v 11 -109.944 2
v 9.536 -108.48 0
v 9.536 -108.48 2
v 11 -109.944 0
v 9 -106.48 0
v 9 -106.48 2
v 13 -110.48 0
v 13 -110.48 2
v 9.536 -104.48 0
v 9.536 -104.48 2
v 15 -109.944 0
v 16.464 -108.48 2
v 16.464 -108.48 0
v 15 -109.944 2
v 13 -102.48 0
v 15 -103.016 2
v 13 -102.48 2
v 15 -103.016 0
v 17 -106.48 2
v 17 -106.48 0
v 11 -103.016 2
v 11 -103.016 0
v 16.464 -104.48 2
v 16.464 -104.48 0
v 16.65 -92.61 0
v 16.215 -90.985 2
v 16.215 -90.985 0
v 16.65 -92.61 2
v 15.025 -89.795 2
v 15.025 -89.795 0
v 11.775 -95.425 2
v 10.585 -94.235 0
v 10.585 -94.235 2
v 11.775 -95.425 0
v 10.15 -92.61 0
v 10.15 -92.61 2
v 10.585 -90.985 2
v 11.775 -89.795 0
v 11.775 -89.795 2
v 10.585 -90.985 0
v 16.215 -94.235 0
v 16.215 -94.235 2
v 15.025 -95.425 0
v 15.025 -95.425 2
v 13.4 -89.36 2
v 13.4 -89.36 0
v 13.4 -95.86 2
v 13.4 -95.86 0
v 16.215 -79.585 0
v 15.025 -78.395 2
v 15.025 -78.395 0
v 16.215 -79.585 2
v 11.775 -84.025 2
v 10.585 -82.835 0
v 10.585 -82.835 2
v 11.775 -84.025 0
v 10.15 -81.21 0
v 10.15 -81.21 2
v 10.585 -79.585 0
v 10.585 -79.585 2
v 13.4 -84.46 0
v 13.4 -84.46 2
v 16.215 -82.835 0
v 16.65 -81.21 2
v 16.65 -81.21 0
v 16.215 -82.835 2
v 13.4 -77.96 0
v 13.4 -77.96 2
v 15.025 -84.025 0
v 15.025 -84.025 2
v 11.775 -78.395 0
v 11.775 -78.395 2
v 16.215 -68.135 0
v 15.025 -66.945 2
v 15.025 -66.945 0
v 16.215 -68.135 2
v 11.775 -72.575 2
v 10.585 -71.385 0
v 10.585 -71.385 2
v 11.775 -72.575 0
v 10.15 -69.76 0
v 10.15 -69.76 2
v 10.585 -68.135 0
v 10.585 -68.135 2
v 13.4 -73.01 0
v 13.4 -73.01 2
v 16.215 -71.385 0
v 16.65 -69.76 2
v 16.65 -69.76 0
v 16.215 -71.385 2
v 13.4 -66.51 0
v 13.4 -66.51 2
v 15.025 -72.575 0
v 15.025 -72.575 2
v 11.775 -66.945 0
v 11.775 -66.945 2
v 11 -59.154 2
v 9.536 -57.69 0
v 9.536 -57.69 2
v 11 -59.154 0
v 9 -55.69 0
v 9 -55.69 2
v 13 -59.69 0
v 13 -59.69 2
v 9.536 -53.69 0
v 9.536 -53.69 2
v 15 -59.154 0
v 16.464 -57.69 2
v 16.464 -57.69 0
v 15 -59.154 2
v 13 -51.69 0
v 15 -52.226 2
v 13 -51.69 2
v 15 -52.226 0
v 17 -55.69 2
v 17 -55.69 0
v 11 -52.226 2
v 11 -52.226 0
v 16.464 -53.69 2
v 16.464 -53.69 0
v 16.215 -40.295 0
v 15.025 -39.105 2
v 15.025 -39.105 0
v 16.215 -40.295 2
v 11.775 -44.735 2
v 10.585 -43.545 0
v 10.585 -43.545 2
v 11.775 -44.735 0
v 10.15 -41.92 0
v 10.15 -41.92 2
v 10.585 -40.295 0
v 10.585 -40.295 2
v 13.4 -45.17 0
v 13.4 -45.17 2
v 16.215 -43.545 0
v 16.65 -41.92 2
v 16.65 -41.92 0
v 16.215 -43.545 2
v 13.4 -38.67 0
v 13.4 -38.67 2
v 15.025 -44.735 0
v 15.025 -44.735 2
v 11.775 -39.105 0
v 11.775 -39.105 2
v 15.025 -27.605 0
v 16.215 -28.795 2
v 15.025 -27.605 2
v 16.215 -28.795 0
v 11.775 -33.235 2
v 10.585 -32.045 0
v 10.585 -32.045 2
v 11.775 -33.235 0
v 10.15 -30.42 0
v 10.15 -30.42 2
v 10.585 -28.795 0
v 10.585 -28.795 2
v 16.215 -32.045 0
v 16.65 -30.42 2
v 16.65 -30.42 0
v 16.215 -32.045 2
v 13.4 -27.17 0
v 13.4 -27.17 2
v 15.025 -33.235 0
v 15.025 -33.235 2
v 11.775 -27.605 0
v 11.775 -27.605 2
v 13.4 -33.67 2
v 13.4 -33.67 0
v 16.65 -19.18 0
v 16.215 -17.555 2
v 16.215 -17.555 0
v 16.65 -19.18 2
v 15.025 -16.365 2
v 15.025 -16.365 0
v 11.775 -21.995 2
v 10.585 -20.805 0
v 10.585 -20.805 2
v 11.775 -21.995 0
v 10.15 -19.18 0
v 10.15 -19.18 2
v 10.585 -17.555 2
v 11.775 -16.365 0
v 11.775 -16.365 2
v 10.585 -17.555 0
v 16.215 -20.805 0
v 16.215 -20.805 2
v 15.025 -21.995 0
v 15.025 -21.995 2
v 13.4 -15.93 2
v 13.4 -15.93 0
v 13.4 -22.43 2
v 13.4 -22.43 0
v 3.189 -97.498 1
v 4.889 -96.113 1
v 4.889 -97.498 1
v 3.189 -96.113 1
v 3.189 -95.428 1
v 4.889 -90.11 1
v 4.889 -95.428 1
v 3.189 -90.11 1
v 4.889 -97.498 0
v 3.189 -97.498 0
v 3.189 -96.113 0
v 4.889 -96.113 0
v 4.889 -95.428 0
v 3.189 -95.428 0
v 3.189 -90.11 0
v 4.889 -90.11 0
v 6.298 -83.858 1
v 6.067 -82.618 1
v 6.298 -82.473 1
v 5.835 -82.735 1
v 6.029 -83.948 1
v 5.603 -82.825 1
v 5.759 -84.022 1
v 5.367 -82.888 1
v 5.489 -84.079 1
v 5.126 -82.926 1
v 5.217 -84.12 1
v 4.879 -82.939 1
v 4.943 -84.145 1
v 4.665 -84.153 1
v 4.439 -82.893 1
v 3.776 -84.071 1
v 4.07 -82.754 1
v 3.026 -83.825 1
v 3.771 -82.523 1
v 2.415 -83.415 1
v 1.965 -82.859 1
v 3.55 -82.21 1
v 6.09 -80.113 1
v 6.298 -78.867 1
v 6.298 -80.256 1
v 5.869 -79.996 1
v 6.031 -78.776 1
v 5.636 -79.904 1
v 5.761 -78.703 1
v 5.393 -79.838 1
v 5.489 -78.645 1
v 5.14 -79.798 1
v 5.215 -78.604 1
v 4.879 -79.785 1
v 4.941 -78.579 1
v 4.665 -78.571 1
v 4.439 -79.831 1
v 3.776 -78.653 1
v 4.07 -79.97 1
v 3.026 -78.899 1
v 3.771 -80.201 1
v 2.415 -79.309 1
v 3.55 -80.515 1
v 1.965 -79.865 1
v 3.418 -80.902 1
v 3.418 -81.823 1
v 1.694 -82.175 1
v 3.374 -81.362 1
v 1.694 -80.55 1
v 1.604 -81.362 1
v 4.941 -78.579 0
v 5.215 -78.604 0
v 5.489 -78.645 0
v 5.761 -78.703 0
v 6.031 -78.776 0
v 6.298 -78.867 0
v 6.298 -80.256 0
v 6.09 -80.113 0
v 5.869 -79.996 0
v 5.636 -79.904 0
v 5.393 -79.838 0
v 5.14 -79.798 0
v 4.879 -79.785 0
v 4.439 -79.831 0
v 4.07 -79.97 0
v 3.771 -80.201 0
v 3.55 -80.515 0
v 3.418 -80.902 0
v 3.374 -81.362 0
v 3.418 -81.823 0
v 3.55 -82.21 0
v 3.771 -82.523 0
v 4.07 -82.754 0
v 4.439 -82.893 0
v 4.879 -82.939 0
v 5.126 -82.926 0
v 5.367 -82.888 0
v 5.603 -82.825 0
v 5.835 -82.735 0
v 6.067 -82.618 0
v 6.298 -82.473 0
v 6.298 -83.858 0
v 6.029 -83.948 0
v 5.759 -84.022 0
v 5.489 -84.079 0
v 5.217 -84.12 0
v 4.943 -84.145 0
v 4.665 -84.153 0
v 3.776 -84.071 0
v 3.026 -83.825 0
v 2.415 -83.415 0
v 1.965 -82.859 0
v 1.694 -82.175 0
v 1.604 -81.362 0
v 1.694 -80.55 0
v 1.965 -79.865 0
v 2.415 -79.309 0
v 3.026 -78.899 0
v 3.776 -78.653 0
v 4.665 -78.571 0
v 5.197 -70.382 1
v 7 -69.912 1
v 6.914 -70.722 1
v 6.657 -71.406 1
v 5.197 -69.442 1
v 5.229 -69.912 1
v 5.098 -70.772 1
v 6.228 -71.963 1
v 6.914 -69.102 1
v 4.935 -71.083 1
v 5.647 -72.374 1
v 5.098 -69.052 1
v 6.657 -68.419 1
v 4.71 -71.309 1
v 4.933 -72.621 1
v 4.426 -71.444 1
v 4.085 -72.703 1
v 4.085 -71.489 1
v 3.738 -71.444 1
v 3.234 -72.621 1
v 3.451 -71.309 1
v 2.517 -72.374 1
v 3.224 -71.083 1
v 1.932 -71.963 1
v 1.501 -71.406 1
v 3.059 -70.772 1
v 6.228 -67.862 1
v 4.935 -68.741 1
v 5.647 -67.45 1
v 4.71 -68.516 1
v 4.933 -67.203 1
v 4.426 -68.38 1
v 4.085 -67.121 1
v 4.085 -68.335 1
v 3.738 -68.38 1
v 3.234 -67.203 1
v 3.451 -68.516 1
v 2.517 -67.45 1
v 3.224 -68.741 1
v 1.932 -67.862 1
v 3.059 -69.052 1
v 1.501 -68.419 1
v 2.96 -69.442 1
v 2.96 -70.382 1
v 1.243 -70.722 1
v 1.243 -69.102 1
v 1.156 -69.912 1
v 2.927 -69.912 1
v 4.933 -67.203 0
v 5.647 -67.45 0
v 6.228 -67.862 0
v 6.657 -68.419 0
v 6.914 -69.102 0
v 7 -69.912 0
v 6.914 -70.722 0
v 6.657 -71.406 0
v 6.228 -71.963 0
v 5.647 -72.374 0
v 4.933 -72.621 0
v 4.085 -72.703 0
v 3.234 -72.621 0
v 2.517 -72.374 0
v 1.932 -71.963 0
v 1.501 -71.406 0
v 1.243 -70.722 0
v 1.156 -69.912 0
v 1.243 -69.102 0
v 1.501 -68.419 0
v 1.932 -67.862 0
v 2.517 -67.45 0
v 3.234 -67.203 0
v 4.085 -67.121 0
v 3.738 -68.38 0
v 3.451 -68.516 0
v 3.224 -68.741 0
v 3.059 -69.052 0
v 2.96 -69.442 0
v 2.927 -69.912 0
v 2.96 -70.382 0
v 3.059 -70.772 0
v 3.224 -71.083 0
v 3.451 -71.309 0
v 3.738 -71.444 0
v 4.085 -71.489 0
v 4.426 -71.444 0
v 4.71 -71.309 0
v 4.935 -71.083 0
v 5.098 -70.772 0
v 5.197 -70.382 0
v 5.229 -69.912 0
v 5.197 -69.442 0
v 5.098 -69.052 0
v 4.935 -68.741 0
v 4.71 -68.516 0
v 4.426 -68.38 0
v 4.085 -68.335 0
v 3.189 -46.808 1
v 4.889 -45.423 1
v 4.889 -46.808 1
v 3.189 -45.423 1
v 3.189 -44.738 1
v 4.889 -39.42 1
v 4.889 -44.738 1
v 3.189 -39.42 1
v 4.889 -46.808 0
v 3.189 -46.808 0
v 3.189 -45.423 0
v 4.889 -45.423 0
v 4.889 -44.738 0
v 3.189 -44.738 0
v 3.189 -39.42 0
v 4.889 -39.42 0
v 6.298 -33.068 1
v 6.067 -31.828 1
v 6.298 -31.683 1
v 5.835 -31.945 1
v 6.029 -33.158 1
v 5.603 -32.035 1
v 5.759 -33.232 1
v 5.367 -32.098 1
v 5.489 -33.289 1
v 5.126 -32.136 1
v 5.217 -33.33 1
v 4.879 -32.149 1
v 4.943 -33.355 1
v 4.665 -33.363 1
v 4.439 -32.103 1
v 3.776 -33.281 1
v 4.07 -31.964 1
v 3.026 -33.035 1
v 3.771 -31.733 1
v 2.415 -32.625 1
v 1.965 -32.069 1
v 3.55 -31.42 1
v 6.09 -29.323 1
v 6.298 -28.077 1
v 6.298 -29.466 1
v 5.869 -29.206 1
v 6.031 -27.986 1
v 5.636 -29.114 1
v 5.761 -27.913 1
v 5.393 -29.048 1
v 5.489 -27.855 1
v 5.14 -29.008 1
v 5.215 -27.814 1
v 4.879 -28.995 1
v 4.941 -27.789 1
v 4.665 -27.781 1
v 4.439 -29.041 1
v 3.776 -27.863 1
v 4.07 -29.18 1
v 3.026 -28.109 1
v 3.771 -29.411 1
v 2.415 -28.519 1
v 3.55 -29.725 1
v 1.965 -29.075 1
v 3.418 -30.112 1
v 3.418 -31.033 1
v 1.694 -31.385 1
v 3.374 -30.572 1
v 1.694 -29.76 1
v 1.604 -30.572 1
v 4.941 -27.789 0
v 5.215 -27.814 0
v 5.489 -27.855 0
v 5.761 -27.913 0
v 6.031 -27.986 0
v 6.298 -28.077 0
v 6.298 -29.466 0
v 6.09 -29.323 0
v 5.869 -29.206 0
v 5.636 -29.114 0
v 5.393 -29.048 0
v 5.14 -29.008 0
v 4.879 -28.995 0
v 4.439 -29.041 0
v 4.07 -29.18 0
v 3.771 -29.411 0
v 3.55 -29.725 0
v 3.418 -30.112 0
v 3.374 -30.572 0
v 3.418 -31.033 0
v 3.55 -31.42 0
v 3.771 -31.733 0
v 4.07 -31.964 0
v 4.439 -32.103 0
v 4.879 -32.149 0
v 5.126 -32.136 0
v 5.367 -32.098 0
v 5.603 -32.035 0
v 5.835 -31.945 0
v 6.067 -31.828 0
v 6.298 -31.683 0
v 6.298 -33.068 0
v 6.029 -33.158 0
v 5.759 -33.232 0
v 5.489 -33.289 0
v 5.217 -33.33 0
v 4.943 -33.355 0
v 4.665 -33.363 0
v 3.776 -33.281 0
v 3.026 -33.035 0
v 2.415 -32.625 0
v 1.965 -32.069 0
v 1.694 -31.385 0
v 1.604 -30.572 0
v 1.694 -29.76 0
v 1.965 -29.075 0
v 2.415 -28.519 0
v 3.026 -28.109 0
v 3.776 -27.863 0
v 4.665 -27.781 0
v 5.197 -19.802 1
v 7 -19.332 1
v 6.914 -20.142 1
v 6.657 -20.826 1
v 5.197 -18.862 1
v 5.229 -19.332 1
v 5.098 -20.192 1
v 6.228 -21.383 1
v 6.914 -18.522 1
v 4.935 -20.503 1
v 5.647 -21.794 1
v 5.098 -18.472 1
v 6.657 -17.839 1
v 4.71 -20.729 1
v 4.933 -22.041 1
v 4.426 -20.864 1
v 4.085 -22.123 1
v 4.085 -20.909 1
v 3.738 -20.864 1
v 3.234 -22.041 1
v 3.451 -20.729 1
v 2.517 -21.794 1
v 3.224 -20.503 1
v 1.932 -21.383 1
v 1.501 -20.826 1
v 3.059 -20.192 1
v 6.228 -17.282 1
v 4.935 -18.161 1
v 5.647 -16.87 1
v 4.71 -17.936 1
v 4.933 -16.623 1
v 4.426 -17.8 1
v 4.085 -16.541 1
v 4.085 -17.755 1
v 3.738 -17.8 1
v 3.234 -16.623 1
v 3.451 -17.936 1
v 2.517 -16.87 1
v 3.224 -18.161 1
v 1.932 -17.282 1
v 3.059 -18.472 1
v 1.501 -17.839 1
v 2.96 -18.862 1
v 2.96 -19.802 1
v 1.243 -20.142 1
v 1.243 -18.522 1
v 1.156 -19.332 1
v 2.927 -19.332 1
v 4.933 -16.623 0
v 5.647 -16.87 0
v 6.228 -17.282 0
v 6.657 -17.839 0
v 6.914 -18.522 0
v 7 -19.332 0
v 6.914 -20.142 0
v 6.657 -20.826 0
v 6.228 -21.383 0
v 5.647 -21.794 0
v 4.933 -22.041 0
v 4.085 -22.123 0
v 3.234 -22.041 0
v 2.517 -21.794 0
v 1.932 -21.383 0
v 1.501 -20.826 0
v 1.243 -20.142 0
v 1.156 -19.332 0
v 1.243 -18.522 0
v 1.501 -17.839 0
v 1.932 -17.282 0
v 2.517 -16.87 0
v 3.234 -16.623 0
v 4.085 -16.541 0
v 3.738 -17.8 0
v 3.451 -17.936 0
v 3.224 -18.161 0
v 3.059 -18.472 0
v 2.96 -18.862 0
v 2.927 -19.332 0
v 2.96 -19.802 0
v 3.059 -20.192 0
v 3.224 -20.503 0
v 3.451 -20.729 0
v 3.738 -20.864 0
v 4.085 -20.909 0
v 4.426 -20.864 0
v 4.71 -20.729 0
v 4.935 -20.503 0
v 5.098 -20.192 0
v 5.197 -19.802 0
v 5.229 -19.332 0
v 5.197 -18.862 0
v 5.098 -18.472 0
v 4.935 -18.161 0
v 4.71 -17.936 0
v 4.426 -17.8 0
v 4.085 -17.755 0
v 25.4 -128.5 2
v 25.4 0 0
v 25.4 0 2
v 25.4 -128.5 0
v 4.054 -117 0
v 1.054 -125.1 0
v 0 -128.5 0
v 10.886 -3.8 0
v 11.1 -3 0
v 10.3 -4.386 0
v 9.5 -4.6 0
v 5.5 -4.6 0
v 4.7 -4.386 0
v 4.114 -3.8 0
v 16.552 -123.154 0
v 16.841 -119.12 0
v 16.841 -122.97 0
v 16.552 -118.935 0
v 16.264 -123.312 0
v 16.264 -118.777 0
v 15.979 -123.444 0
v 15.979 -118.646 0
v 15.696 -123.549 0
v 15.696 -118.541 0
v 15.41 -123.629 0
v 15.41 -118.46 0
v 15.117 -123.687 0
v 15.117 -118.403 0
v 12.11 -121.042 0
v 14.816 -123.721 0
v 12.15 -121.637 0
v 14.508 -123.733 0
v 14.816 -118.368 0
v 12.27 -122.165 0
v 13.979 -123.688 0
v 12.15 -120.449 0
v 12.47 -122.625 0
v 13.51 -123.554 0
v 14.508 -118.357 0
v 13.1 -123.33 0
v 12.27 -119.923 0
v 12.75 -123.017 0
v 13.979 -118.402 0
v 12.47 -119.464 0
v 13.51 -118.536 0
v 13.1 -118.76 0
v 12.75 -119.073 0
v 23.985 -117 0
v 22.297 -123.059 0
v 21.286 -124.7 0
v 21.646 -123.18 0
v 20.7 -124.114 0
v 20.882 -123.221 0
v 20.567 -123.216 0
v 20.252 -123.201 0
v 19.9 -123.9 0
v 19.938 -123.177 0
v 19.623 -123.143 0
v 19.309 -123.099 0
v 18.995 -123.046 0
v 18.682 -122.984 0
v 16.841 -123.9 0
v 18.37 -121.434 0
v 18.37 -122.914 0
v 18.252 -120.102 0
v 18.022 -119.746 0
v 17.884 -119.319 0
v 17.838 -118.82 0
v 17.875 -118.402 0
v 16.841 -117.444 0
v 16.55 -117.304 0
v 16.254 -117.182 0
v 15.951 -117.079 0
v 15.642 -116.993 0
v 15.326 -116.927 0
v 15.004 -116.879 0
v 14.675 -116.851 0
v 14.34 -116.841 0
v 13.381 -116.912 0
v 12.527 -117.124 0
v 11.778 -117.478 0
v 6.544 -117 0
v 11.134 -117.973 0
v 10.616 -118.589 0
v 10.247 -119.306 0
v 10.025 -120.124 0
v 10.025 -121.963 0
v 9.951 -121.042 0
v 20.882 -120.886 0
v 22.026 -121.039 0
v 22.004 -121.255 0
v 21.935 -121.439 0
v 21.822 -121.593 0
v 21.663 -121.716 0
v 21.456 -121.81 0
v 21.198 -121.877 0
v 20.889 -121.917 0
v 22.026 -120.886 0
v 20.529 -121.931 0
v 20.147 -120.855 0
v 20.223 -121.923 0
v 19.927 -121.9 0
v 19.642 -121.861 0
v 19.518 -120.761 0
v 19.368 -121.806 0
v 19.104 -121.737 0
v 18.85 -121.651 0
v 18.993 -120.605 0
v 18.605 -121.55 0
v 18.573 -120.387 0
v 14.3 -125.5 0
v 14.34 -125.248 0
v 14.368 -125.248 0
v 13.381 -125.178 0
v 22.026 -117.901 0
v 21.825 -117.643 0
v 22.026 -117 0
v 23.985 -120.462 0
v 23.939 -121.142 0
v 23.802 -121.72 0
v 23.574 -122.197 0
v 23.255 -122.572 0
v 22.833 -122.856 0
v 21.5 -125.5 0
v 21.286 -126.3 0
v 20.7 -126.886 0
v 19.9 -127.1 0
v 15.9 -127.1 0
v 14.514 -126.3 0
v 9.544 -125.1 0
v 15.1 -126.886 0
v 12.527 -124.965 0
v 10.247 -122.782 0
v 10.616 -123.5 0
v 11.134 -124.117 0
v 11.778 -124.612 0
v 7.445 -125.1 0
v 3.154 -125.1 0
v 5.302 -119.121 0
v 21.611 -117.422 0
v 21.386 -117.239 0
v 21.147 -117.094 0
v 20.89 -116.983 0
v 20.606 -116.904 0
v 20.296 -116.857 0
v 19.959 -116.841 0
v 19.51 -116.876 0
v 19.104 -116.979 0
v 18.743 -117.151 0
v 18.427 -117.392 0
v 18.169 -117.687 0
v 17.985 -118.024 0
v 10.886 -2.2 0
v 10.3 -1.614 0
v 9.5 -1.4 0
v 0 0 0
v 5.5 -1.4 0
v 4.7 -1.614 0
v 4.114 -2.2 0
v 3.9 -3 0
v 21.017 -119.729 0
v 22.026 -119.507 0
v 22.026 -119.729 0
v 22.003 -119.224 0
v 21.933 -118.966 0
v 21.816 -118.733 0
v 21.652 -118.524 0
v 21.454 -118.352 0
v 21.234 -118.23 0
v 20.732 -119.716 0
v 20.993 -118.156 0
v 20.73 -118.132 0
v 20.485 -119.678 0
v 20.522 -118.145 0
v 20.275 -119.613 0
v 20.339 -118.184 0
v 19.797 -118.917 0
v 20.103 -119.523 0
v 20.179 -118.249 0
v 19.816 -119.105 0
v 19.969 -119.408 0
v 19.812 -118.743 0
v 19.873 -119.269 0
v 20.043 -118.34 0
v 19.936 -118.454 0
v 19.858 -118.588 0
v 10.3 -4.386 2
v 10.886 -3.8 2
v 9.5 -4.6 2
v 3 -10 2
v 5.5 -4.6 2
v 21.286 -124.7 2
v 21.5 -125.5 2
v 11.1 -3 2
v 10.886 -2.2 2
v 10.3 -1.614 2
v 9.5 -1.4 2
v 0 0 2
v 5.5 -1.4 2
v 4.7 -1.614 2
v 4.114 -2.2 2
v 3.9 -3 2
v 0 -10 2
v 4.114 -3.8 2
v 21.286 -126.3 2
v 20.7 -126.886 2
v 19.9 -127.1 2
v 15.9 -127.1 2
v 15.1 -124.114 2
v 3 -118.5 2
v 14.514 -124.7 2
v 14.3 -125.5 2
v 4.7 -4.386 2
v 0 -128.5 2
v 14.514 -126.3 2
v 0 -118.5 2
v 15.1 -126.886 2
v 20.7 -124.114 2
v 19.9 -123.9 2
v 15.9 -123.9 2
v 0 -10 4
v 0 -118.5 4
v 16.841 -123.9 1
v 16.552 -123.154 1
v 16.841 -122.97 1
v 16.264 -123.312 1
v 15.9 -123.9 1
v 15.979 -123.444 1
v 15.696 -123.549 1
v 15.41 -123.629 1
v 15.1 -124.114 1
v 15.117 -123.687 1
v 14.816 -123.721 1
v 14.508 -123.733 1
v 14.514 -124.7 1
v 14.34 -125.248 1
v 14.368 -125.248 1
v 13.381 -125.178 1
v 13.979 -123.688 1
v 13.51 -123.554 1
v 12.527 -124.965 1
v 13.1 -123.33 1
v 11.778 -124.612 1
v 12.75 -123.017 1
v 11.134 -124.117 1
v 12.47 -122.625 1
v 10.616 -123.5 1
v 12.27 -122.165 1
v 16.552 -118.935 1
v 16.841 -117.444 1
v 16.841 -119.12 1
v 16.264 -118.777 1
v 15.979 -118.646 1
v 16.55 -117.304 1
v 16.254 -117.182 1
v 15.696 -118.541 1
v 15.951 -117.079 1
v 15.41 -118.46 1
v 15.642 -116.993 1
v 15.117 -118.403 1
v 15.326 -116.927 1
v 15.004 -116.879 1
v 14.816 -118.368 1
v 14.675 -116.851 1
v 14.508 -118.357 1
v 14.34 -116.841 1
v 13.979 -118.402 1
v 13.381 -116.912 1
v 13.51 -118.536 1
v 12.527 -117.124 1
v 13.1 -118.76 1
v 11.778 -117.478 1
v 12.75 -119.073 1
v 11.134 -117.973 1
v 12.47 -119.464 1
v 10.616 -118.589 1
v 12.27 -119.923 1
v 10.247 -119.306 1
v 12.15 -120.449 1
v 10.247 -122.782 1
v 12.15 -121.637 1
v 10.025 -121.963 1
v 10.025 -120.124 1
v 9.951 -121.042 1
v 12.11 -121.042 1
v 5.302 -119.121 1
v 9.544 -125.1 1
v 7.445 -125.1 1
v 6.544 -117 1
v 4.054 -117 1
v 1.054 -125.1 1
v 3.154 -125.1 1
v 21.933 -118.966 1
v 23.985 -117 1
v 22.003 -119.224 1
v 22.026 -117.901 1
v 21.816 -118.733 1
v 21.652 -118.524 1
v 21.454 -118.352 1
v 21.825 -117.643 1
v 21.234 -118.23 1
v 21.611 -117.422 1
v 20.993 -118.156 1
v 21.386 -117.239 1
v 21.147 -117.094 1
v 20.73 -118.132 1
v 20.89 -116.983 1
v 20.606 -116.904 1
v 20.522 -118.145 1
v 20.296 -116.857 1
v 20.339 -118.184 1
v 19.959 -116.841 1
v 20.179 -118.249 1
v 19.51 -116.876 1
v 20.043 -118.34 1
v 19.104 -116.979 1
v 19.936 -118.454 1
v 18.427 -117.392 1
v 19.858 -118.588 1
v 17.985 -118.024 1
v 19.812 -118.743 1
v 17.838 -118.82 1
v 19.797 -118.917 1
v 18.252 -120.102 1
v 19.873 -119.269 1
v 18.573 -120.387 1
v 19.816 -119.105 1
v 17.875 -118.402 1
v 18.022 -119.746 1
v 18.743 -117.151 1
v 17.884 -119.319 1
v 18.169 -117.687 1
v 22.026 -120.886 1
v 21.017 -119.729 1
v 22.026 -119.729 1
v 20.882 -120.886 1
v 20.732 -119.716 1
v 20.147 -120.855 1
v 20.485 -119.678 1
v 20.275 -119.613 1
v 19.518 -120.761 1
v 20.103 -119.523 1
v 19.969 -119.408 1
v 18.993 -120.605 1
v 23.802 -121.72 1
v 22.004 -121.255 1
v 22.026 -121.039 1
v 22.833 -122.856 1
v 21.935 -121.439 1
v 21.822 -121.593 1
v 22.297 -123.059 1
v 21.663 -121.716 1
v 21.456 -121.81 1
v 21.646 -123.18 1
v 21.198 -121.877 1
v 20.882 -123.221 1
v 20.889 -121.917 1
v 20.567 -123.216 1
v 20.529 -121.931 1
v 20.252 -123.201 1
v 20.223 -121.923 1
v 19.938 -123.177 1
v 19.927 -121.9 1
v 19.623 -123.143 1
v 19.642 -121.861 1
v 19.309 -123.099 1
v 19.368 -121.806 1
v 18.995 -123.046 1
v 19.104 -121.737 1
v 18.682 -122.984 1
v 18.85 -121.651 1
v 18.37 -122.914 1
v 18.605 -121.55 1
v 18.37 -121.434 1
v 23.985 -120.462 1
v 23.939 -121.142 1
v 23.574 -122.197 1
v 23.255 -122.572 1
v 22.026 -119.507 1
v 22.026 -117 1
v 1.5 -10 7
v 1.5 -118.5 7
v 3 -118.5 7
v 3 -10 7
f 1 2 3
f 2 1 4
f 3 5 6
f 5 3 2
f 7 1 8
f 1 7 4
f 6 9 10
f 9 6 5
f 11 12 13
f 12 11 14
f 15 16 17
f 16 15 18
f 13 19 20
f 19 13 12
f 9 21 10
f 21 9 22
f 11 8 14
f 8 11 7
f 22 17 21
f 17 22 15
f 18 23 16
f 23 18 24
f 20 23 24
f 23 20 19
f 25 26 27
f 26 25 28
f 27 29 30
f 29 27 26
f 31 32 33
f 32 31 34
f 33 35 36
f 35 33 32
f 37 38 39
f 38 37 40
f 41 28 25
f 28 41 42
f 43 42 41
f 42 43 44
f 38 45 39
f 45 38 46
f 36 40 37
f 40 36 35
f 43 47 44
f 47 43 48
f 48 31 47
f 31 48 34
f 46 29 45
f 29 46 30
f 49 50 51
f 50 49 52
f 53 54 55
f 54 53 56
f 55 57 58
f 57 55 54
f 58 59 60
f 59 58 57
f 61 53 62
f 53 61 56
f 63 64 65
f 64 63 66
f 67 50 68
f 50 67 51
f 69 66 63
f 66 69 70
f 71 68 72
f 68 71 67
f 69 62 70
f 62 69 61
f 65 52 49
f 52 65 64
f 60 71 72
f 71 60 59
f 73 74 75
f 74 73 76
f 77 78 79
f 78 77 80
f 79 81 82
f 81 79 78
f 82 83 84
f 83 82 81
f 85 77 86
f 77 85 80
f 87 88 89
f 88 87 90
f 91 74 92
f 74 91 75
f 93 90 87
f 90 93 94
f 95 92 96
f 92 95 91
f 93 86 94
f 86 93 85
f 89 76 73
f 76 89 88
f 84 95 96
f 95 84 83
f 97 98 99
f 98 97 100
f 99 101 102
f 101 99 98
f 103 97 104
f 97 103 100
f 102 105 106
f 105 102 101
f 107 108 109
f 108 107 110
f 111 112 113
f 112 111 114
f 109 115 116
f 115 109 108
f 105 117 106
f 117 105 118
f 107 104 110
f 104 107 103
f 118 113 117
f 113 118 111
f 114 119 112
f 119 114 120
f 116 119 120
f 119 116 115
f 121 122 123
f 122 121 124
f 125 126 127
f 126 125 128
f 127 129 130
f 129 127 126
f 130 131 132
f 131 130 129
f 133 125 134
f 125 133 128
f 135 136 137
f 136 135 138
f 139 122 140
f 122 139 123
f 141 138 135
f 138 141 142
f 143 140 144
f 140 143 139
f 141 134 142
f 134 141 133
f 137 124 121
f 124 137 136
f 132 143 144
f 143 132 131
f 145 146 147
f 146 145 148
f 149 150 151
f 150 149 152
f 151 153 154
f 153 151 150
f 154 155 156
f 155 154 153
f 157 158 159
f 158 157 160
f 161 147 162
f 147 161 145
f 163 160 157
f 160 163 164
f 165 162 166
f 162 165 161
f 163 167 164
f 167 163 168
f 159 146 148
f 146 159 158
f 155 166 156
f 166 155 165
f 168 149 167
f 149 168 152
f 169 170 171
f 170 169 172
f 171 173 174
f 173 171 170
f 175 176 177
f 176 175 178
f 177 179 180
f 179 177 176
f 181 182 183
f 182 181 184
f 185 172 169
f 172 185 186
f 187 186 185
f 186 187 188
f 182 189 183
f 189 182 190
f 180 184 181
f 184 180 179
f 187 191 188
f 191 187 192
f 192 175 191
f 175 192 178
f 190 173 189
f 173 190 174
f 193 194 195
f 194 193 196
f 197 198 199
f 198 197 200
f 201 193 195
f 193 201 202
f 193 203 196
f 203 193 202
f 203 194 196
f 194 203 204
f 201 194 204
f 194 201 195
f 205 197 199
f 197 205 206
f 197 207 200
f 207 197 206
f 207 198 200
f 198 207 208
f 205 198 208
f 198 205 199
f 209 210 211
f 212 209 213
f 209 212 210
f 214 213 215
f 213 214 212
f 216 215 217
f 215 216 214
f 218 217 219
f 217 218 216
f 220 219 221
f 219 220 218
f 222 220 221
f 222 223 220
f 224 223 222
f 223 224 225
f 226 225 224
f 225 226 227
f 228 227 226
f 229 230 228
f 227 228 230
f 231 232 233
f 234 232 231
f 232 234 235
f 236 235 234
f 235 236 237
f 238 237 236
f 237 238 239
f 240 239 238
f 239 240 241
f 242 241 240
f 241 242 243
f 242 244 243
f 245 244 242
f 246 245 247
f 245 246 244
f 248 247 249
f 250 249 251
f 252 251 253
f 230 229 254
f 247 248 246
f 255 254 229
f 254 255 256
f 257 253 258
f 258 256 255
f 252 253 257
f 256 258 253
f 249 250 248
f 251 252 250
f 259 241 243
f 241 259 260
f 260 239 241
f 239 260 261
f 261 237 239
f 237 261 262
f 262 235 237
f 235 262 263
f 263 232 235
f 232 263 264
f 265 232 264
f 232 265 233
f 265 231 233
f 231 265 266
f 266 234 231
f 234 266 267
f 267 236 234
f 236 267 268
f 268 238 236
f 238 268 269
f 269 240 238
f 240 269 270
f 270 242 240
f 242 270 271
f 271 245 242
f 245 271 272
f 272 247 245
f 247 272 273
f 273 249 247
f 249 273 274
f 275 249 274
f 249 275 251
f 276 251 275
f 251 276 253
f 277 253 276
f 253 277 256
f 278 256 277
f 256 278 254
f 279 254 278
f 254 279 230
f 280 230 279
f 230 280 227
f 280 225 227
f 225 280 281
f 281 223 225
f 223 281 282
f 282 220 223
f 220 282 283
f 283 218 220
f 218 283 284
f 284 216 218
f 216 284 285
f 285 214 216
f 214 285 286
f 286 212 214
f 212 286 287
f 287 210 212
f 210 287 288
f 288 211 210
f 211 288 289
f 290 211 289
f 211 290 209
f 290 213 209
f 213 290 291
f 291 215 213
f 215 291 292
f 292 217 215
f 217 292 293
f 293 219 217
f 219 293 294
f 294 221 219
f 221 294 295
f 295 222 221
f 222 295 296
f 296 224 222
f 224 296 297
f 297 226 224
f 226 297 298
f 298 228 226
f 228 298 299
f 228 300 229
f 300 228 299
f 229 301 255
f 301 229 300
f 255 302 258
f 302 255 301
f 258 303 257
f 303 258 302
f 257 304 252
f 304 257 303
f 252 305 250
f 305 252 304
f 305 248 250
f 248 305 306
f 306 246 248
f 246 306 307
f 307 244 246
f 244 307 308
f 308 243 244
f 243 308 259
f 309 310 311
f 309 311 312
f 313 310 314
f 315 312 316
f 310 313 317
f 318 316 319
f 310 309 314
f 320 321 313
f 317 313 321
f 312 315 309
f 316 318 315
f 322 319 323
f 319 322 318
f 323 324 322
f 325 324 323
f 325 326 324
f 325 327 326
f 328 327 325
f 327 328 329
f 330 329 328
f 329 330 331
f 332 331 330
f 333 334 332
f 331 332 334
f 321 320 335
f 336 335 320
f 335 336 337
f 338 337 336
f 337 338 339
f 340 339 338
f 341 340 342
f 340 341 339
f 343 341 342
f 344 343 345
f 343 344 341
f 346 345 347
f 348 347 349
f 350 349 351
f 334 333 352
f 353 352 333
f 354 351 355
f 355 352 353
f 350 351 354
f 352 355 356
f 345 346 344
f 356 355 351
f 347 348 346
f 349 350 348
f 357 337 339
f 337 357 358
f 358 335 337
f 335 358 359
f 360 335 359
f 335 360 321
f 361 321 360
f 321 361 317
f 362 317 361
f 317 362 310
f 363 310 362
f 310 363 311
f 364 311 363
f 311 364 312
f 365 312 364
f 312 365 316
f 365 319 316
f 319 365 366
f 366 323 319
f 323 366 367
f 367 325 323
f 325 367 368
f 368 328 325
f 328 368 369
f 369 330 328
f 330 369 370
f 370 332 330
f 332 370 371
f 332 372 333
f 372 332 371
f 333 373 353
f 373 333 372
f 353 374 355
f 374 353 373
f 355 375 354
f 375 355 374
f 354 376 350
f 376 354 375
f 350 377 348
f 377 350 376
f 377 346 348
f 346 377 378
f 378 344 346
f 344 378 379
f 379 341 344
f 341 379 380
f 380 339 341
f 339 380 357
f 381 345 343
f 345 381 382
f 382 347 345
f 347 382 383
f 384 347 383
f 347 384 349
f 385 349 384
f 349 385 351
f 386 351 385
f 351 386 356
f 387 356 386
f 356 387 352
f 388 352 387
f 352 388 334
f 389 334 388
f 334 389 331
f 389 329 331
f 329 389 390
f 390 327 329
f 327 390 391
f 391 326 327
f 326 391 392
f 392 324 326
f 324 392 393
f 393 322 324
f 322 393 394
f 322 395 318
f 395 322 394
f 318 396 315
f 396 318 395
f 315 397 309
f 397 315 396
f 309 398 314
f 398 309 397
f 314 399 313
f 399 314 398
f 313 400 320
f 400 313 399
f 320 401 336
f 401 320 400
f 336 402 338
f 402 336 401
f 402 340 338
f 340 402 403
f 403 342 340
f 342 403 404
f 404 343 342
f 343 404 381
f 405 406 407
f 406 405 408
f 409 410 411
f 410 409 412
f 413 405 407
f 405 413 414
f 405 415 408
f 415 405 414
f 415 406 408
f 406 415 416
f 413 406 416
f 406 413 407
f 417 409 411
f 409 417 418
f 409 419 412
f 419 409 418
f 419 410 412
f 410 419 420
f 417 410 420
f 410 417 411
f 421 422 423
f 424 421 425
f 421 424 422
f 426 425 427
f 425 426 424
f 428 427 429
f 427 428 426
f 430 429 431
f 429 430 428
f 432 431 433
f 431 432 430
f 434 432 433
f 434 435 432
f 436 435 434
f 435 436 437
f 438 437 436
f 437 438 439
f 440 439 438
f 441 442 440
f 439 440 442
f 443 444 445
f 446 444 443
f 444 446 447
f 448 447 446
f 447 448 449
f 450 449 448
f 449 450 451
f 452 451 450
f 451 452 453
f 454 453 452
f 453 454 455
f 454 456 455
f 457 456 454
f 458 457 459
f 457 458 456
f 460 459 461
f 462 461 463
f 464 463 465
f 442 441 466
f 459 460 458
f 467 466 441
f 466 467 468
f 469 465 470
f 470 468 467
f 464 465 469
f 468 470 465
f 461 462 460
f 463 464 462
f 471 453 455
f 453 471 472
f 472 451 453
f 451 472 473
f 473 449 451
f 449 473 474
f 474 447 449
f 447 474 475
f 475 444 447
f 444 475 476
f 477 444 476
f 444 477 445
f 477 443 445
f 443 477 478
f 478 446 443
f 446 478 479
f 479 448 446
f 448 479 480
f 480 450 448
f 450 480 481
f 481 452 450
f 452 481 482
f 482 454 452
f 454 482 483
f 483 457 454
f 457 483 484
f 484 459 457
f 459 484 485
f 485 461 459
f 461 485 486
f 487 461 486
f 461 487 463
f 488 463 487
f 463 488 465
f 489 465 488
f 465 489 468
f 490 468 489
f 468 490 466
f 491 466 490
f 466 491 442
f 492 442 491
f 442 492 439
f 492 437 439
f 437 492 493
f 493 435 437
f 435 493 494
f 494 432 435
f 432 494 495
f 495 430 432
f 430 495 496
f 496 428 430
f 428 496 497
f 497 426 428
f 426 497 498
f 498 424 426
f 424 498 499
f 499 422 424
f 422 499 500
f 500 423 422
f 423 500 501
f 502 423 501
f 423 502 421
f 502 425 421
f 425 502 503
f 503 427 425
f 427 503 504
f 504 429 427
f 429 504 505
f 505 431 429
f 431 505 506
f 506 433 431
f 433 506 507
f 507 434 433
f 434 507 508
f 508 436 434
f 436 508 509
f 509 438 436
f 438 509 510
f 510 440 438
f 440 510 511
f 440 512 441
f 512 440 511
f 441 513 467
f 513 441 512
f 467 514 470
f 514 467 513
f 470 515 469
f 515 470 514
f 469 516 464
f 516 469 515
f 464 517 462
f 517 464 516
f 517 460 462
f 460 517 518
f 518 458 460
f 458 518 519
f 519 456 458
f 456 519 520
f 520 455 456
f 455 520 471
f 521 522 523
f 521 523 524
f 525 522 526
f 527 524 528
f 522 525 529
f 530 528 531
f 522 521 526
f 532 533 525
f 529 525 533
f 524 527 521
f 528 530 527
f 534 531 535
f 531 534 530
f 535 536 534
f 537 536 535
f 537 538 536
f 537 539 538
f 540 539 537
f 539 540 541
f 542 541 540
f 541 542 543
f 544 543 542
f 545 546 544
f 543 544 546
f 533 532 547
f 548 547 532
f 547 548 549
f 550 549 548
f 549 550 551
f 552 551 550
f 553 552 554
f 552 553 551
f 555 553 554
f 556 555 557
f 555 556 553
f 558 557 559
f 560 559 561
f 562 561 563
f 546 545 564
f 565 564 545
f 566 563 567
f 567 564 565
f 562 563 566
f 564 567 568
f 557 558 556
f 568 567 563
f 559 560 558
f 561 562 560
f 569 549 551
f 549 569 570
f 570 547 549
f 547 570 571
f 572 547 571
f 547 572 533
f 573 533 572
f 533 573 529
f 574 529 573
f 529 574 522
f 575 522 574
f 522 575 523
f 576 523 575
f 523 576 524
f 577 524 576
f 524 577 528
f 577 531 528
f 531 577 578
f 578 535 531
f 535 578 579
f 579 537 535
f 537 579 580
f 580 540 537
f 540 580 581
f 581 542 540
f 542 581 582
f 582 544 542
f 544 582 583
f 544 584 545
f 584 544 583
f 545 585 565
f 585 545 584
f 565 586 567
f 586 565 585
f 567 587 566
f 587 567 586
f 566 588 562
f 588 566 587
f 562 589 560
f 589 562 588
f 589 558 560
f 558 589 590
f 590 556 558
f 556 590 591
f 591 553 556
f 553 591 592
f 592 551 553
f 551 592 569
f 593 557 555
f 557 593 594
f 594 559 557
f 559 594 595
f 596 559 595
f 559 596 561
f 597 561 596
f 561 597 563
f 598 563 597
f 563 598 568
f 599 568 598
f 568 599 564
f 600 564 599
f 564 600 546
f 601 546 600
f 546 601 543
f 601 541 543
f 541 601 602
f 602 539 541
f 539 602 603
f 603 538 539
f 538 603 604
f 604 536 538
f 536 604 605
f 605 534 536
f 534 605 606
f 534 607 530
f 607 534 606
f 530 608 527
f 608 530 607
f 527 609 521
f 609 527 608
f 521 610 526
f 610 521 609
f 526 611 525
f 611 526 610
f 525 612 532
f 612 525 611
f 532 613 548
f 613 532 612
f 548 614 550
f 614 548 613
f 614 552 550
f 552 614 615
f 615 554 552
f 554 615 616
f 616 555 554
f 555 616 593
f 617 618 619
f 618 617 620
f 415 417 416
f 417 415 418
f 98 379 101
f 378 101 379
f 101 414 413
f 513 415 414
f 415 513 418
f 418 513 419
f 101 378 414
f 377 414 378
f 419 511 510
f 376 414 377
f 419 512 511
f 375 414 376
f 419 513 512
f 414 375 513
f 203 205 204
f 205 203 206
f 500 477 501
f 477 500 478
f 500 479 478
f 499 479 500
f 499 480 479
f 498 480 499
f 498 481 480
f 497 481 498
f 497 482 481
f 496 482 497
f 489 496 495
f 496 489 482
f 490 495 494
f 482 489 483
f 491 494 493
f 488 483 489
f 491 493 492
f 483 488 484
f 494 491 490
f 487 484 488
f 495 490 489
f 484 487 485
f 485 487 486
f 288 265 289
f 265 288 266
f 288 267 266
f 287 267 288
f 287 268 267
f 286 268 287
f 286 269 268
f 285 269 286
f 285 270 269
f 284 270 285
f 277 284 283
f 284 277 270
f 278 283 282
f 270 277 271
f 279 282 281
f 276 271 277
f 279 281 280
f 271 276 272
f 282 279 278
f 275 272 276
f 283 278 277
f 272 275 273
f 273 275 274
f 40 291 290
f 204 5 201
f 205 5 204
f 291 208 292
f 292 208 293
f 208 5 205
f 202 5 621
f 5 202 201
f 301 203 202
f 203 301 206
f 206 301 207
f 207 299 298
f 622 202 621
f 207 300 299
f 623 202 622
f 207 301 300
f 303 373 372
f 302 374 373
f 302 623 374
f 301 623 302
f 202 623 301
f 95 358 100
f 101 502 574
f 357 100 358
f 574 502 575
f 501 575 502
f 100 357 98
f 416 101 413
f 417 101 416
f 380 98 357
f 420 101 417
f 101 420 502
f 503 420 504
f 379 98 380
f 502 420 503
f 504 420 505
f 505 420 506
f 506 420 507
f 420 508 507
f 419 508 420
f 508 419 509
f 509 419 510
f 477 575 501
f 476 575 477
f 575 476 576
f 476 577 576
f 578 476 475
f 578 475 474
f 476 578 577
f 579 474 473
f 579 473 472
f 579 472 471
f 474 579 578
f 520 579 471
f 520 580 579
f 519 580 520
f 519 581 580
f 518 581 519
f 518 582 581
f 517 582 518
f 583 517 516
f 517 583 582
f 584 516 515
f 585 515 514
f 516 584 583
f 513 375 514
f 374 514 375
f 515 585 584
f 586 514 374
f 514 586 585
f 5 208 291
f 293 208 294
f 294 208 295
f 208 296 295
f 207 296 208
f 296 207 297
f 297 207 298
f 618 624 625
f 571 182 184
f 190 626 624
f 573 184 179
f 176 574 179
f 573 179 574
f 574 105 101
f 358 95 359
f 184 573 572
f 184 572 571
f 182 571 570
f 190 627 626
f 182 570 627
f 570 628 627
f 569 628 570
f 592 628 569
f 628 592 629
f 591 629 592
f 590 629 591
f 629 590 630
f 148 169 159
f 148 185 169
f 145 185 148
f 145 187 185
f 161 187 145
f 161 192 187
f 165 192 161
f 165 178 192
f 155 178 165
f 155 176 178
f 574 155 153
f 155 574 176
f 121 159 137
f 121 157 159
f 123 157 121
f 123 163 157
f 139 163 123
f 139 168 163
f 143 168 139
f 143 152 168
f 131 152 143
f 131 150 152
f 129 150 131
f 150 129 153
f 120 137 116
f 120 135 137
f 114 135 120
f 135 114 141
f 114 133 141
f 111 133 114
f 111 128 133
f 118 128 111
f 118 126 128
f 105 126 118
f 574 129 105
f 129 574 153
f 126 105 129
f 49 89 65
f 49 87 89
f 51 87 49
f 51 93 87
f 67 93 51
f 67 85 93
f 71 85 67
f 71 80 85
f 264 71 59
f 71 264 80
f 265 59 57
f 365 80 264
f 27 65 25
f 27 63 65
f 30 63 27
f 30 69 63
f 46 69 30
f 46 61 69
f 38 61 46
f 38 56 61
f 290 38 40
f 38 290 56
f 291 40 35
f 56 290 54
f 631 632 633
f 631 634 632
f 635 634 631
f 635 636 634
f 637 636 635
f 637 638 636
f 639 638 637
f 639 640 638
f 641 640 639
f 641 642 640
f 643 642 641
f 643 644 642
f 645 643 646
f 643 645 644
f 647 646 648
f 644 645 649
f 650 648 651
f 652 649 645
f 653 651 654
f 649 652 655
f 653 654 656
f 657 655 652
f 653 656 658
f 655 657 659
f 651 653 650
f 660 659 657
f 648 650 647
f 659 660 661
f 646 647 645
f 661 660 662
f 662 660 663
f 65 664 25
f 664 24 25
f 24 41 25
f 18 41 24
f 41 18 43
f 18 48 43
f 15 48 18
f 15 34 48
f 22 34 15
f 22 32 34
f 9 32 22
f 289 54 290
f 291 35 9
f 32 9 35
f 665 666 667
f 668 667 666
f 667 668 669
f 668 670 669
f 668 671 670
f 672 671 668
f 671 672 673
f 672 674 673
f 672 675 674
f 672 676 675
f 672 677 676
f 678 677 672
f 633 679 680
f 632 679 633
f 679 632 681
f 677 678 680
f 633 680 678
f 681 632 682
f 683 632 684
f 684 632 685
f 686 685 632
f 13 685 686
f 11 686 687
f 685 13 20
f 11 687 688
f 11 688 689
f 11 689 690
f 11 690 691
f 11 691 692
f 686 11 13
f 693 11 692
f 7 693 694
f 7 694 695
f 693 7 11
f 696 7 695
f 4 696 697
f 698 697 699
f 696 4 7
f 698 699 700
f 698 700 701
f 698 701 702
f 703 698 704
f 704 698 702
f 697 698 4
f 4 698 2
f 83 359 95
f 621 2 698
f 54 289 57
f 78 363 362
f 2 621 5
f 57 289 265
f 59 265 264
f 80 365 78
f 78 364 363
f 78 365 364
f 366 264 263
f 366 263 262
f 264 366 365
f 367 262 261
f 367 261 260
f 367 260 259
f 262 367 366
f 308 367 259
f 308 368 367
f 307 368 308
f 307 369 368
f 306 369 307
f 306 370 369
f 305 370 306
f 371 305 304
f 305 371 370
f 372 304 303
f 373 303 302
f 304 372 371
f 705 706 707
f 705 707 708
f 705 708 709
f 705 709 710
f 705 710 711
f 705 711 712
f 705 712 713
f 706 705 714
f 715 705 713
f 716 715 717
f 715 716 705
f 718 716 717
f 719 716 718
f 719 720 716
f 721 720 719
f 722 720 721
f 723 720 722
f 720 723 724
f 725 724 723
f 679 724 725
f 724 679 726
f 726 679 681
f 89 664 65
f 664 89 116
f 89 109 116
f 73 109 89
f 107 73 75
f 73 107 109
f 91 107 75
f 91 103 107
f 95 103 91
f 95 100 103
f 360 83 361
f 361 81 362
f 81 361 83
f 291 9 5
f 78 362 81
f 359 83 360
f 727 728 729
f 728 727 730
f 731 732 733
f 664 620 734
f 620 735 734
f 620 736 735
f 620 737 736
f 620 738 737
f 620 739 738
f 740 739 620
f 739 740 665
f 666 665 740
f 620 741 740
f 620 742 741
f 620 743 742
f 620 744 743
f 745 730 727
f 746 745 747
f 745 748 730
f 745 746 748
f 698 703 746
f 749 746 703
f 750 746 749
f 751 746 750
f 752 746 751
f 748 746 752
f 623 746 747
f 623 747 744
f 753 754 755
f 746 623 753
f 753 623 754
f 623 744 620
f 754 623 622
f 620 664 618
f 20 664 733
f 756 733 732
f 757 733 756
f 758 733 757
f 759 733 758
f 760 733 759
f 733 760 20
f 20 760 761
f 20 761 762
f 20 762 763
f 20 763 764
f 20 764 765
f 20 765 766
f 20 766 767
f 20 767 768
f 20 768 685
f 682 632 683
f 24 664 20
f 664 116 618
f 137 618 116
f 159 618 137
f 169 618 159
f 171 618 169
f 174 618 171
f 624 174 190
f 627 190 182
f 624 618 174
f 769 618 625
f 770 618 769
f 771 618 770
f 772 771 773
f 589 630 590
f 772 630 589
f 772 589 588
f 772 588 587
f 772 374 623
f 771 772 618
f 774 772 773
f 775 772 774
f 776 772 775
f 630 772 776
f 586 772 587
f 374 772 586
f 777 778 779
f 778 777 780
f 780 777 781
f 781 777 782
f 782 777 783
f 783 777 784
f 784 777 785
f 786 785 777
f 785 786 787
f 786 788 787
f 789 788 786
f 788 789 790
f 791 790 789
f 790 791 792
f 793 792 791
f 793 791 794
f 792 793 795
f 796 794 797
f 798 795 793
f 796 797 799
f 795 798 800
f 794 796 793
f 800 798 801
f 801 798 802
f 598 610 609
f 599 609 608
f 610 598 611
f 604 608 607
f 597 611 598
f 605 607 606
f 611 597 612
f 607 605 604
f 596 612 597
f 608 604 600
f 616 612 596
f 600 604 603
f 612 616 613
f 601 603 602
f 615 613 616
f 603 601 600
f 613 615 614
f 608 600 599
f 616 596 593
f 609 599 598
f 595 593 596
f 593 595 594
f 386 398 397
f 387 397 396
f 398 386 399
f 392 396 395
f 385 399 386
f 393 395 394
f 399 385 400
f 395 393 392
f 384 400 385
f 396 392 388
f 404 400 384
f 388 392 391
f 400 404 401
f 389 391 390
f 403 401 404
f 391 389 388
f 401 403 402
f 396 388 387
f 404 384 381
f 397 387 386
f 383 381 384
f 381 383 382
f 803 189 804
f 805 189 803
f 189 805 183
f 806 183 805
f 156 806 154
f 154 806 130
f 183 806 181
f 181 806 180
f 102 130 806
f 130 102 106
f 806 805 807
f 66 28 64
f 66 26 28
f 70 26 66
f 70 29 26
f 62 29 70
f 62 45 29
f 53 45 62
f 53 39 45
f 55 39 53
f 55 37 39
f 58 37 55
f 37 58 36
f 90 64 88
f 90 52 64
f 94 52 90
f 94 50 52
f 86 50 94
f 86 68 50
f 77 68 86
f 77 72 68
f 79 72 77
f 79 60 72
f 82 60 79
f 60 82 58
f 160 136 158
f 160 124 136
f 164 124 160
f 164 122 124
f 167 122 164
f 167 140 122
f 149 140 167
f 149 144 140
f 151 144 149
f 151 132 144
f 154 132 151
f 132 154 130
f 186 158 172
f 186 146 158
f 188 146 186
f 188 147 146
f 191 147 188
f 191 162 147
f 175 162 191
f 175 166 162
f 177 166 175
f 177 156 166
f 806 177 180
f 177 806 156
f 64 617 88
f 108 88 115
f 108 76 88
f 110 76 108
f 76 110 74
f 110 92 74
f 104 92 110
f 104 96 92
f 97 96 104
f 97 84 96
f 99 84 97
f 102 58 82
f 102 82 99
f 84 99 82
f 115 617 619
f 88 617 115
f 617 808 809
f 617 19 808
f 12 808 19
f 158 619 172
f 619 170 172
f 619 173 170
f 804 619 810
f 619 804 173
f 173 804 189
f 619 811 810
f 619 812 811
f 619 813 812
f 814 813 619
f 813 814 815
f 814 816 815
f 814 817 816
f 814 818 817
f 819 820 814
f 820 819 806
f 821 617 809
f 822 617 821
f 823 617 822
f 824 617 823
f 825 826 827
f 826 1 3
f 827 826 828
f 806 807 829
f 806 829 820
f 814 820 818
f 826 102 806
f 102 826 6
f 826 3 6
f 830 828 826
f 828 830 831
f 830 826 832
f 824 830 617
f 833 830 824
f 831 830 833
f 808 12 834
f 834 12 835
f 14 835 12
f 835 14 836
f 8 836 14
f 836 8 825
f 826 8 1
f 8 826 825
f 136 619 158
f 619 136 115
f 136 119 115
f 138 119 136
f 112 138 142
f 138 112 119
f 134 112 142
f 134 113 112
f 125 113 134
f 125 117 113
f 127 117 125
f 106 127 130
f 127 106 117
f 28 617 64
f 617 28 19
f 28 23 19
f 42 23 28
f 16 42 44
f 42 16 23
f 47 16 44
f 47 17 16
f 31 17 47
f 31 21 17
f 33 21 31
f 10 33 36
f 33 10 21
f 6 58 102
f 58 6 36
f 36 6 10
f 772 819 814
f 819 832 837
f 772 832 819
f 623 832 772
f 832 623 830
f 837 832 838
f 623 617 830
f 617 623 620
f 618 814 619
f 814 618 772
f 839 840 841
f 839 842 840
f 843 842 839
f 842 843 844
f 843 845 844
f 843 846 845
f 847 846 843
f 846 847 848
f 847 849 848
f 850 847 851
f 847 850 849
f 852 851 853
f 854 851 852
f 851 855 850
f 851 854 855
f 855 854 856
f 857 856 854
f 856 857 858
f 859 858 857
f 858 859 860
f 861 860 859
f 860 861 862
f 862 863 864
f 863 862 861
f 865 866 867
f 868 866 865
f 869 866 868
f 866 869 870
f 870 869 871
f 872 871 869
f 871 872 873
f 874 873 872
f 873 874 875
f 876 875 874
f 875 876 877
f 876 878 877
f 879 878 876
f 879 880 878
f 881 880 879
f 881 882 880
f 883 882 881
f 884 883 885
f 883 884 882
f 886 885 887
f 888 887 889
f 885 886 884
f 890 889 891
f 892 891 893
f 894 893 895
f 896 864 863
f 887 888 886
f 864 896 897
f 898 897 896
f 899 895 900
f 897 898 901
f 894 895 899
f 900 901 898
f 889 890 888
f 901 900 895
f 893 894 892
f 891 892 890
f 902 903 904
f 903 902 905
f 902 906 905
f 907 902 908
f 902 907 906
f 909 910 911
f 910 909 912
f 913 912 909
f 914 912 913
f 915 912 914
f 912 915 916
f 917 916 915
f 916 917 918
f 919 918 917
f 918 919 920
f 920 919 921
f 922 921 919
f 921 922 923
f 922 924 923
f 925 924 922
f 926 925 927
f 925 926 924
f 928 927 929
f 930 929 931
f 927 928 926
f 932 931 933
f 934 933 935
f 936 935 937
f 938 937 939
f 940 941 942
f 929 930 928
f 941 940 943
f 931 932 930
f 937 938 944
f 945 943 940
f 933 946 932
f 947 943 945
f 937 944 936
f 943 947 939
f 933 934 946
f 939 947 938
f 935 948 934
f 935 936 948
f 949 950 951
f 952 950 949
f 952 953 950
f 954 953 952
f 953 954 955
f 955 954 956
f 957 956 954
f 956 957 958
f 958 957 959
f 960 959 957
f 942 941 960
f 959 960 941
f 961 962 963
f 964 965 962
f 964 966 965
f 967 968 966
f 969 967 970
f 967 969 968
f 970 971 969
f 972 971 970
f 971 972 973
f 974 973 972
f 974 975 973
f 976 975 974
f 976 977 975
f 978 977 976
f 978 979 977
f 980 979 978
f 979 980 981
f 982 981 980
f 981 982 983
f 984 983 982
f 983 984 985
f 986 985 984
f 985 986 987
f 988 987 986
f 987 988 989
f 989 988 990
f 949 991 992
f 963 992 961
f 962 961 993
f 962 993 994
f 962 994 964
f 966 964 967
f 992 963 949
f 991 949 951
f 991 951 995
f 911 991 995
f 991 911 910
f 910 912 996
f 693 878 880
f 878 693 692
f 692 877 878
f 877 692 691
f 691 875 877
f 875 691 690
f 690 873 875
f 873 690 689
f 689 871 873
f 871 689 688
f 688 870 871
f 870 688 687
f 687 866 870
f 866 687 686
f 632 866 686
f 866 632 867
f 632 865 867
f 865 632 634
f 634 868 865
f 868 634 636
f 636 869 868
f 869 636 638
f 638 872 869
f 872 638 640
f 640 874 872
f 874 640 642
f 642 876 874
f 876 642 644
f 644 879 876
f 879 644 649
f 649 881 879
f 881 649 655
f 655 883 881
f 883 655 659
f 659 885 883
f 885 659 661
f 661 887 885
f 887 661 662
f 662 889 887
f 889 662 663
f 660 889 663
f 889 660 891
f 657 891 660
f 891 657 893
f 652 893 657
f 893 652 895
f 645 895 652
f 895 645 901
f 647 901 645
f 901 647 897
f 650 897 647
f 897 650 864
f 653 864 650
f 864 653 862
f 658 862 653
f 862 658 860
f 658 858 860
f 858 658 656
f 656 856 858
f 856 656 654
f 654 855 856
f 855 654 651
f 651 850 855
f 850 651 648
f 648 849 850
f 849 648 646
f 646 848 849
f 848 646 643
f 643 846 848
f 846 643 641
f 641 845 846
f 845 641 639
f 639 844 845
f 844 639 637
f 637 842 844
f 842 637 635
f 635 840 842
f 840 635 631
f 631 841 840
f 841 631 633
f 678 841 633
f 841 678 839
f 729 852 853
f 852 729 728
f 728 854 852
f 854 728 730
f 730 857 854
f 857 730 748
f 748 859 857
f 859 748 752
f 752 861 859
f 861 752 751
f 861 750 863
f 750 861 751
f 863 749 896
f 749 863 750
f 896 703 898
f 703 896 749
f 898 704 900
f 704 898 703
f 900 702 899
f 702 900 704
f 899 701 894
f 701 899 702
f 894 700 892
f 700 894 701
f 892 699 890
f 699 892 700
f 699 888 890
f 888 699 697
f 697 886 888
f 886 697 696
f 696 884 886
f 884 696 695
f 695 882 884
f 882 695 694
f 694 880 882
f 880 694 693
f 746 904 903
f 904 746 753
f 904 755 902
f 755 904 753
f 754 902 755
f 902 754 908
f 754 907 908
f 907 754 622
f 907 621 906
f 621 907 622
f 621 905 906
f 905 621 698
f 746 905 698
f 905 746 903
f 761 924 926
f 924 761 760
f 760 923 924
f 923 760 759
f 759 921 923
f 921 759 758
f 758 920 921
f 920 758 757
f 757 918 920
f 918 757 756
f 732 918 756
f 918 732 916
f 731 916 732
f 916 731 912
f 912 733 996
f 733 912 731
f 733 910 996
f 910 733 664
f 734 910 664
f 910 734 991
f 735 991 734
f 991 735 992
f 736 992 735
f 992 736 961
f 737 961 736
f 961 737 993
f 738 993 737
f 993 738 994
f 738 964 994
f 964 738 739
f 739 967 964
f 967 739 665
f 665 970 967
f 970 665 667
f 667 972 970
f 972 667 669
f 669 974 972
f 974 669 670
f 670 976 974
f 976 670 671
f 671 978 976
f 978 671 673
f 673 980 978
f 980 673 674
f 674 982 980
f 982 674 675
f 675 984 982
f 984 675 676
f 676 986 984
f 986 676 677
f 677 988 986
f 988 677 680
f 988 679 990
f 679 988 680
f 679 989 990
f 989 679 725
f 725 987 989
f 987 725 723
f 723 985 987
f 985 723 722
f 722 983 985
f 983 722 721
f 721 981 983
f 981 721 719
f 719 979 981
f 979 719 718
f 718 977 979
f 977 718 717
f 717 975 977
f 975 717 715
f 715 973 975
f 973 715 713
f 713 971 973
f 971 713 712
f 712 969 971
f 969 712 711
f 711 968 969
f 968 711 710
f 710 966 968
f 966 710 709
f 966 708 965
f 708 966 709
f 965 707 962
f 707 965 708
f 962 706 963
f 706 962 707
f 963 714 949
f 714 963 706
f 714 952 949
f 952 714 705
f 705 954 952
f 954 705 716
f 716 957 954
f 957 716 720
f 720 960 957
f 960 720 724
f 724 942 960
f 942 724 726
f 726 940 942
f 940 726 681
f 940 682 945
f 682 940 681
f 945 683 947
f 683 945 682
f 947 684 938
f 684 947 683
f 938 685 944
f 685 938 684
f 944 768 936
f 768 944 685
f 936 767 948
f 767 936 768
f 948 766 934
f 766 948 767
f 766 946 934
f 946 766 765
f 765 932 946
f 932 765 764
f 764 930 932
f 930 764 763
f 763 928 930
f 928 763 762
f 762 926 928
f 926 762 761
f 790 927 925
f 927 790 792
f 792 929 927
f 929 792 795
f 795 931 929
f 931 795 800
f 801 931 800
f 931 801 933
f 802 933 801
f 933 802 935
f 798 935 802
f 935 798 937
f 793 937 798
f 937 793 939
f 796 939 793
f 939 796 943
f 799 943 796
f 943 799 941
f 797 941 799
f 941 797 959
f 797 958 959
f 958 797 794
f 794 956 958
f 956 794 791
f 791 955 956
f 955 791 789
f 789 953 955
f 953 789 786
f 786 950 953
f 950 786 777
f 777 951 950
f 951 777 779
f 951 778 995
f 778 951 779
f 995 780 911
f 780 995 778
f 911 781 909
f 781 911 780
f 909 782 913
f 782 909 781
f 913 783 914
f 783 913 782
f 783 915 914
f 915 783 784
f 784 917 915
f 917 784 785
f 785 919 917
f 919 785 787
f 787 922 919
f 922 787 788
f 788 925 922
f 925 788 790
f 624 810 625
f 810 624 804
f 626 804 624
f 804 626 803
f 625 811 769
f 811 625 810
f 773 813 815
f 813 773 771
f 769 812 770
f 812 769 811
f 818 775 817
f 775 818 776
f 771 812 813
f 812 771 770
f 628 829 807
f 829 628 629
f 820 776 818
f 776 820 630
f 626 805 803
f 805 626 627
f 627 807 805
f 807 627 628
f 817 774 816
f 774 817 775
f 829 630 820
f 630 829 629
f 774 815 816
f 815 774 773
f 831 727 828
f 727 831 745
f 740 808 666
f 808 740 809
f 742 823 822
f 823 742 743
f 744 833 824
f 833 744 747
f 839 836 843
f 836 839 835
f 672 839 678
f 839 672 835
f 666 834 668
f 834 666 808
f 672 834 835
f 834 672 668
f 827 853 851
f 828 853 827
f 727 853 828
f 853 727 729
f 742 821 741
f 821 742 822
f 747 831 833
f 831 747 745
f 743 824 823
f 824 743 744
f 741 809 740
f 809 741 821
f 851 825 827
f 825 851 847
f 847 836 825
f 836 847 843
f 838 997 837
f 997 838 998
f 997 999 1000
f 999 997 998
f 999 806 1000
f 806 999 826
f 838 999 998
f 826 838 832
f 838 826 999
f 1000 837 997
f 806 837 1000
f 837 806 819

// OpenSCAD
translate([0,0,2]) rotate([180]) EuroPanel("VCa", 5);

  font = ".SF Compact Display:style=Bold";
  labelFontSize = 7;

module EuroPanel(label, hp) {

  sideOffset = 6;
  panelWidth = hp*5.08;

  Support();
  
  
  difference() {
    cube([hp*5.08, 128.5, 2]);
      
    translate([1,117,1])  {
        linear_extrude(height=2, convexity=4) text(label, size=8, font=font);
    }
    translate([7.5,3]) MountingHole();
    translate([panelWidth - 7.5, 128.5 - 3]) MountingHole();
    /*
adj1: 91.48
in1: 77.61
cv1 66.21
   out1: 54.76
   adj2: 40.69
   in2: 26.92
   cv2: 15.42
   out2: 4.18 
    
    */
    
    
    
    translate ([panelWidth-sideOffset,15, 0]) scale([-1,1,1]) union() {
        translate([0,91.48,0]) KnobHole9mm();
        translate([0,77.61,0]) JackHole();
        translate([0,66.21,0]) JackHole();
        translate([0,54.76,0]) JackHole();
        translate([0,40.69,0]) KnobHole9mm();
        translate([0,26.92,0]) JackHole();
        translate([0,15.42,0]) JackHole();
        translate([0,4.18 ,0]) JackHole();
    }    

    translate([4,12.5,1]) {
        label("i", 77.61);
        label("c", 66.21);
        label("o", 54.76);
        label("i", 26.92);
        label("c", 15.42);
        label("o", 4.18 );        
    }

  }
/*
    color("green", .3)
        translate([panelWidth - sideOffset, 14.25,2])
            cube([1,100,50]);
            */
}

module label(text, y){
      translate([0,y])   {
          linear_extrude(height=2, convexity=4) text(text, size=labelFontSize, font=font, halign="center");
      }
}

module KnobHole16mm() { translate([12.5,0,-.5]) cylinder(h=3, d=8, $fn=12); }
module KnobHole9mm() { translate([6.4,0,-.5]) cylinder(h=3, d=8, $fn=12); }

module JackHole() { translate([6,0,-.5]) cylinder(h=3, d=6.5, $fn=12); }

module LEDHole() { translate([10,0,-.5]) cylinder(h=3, d=5.3, $fn=12); }

module MIDIHole() { translate([10.5,0,-.5]) cylinder(h=3, d=18.5, $fn=24); }

module Support() {
    translate([0,10,0])
    rotate([-90,0,0])
  linear_extrude(108.5)
    polygon([[0,0], [0,2], [1.5,5], [3,5], [3,0]]);
}


module MountingHole() {
  hull() {
    translate([-2,0,-.5]) cylinder(h=3, r=1.6, $fn=12);
    translate([2,0,-.5]) cylinder(h=3, r=1.6, $fn=12);
  }
}

echo(version=version());
